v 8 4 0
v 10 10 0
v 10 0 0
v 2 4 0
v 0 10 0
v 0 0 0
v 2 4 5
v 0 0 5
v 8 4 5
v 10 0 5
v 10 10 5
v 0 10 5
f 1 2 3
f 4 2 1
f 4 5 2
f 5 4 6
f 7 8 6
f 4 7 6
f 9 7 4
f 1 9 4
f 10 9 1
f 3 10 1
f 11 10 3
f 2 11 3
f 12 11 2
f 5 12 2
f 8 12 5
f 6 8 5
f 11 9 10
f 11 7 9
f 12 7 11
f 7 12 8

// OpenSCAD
polyhedron(points = [[0, 0, 0], [2, 4, 0], [8, 4, 0], [10, 0, 0], [10, 10, 0], [0, 10, 0], [0, 0, 5], [2, 4, 5], [8, 4, 5], [10, 0, 5], [10, 10, 5], [0, 10, 5]], faces = [[0, 1, 2, 3, 4, 5], [0, 6, 7], [0, 7, 1], [1, 7, 8], [1, 8, 2], [2, 8, 9], [2, 9, 3], [3, 9, 10], [3, 10, 4], [4, 10, 11], [4, 11, 5], [5, 11, 6], [5, 6, 0], [11, 10, 9, 8, 7, 6]], convexity = 2);
                
